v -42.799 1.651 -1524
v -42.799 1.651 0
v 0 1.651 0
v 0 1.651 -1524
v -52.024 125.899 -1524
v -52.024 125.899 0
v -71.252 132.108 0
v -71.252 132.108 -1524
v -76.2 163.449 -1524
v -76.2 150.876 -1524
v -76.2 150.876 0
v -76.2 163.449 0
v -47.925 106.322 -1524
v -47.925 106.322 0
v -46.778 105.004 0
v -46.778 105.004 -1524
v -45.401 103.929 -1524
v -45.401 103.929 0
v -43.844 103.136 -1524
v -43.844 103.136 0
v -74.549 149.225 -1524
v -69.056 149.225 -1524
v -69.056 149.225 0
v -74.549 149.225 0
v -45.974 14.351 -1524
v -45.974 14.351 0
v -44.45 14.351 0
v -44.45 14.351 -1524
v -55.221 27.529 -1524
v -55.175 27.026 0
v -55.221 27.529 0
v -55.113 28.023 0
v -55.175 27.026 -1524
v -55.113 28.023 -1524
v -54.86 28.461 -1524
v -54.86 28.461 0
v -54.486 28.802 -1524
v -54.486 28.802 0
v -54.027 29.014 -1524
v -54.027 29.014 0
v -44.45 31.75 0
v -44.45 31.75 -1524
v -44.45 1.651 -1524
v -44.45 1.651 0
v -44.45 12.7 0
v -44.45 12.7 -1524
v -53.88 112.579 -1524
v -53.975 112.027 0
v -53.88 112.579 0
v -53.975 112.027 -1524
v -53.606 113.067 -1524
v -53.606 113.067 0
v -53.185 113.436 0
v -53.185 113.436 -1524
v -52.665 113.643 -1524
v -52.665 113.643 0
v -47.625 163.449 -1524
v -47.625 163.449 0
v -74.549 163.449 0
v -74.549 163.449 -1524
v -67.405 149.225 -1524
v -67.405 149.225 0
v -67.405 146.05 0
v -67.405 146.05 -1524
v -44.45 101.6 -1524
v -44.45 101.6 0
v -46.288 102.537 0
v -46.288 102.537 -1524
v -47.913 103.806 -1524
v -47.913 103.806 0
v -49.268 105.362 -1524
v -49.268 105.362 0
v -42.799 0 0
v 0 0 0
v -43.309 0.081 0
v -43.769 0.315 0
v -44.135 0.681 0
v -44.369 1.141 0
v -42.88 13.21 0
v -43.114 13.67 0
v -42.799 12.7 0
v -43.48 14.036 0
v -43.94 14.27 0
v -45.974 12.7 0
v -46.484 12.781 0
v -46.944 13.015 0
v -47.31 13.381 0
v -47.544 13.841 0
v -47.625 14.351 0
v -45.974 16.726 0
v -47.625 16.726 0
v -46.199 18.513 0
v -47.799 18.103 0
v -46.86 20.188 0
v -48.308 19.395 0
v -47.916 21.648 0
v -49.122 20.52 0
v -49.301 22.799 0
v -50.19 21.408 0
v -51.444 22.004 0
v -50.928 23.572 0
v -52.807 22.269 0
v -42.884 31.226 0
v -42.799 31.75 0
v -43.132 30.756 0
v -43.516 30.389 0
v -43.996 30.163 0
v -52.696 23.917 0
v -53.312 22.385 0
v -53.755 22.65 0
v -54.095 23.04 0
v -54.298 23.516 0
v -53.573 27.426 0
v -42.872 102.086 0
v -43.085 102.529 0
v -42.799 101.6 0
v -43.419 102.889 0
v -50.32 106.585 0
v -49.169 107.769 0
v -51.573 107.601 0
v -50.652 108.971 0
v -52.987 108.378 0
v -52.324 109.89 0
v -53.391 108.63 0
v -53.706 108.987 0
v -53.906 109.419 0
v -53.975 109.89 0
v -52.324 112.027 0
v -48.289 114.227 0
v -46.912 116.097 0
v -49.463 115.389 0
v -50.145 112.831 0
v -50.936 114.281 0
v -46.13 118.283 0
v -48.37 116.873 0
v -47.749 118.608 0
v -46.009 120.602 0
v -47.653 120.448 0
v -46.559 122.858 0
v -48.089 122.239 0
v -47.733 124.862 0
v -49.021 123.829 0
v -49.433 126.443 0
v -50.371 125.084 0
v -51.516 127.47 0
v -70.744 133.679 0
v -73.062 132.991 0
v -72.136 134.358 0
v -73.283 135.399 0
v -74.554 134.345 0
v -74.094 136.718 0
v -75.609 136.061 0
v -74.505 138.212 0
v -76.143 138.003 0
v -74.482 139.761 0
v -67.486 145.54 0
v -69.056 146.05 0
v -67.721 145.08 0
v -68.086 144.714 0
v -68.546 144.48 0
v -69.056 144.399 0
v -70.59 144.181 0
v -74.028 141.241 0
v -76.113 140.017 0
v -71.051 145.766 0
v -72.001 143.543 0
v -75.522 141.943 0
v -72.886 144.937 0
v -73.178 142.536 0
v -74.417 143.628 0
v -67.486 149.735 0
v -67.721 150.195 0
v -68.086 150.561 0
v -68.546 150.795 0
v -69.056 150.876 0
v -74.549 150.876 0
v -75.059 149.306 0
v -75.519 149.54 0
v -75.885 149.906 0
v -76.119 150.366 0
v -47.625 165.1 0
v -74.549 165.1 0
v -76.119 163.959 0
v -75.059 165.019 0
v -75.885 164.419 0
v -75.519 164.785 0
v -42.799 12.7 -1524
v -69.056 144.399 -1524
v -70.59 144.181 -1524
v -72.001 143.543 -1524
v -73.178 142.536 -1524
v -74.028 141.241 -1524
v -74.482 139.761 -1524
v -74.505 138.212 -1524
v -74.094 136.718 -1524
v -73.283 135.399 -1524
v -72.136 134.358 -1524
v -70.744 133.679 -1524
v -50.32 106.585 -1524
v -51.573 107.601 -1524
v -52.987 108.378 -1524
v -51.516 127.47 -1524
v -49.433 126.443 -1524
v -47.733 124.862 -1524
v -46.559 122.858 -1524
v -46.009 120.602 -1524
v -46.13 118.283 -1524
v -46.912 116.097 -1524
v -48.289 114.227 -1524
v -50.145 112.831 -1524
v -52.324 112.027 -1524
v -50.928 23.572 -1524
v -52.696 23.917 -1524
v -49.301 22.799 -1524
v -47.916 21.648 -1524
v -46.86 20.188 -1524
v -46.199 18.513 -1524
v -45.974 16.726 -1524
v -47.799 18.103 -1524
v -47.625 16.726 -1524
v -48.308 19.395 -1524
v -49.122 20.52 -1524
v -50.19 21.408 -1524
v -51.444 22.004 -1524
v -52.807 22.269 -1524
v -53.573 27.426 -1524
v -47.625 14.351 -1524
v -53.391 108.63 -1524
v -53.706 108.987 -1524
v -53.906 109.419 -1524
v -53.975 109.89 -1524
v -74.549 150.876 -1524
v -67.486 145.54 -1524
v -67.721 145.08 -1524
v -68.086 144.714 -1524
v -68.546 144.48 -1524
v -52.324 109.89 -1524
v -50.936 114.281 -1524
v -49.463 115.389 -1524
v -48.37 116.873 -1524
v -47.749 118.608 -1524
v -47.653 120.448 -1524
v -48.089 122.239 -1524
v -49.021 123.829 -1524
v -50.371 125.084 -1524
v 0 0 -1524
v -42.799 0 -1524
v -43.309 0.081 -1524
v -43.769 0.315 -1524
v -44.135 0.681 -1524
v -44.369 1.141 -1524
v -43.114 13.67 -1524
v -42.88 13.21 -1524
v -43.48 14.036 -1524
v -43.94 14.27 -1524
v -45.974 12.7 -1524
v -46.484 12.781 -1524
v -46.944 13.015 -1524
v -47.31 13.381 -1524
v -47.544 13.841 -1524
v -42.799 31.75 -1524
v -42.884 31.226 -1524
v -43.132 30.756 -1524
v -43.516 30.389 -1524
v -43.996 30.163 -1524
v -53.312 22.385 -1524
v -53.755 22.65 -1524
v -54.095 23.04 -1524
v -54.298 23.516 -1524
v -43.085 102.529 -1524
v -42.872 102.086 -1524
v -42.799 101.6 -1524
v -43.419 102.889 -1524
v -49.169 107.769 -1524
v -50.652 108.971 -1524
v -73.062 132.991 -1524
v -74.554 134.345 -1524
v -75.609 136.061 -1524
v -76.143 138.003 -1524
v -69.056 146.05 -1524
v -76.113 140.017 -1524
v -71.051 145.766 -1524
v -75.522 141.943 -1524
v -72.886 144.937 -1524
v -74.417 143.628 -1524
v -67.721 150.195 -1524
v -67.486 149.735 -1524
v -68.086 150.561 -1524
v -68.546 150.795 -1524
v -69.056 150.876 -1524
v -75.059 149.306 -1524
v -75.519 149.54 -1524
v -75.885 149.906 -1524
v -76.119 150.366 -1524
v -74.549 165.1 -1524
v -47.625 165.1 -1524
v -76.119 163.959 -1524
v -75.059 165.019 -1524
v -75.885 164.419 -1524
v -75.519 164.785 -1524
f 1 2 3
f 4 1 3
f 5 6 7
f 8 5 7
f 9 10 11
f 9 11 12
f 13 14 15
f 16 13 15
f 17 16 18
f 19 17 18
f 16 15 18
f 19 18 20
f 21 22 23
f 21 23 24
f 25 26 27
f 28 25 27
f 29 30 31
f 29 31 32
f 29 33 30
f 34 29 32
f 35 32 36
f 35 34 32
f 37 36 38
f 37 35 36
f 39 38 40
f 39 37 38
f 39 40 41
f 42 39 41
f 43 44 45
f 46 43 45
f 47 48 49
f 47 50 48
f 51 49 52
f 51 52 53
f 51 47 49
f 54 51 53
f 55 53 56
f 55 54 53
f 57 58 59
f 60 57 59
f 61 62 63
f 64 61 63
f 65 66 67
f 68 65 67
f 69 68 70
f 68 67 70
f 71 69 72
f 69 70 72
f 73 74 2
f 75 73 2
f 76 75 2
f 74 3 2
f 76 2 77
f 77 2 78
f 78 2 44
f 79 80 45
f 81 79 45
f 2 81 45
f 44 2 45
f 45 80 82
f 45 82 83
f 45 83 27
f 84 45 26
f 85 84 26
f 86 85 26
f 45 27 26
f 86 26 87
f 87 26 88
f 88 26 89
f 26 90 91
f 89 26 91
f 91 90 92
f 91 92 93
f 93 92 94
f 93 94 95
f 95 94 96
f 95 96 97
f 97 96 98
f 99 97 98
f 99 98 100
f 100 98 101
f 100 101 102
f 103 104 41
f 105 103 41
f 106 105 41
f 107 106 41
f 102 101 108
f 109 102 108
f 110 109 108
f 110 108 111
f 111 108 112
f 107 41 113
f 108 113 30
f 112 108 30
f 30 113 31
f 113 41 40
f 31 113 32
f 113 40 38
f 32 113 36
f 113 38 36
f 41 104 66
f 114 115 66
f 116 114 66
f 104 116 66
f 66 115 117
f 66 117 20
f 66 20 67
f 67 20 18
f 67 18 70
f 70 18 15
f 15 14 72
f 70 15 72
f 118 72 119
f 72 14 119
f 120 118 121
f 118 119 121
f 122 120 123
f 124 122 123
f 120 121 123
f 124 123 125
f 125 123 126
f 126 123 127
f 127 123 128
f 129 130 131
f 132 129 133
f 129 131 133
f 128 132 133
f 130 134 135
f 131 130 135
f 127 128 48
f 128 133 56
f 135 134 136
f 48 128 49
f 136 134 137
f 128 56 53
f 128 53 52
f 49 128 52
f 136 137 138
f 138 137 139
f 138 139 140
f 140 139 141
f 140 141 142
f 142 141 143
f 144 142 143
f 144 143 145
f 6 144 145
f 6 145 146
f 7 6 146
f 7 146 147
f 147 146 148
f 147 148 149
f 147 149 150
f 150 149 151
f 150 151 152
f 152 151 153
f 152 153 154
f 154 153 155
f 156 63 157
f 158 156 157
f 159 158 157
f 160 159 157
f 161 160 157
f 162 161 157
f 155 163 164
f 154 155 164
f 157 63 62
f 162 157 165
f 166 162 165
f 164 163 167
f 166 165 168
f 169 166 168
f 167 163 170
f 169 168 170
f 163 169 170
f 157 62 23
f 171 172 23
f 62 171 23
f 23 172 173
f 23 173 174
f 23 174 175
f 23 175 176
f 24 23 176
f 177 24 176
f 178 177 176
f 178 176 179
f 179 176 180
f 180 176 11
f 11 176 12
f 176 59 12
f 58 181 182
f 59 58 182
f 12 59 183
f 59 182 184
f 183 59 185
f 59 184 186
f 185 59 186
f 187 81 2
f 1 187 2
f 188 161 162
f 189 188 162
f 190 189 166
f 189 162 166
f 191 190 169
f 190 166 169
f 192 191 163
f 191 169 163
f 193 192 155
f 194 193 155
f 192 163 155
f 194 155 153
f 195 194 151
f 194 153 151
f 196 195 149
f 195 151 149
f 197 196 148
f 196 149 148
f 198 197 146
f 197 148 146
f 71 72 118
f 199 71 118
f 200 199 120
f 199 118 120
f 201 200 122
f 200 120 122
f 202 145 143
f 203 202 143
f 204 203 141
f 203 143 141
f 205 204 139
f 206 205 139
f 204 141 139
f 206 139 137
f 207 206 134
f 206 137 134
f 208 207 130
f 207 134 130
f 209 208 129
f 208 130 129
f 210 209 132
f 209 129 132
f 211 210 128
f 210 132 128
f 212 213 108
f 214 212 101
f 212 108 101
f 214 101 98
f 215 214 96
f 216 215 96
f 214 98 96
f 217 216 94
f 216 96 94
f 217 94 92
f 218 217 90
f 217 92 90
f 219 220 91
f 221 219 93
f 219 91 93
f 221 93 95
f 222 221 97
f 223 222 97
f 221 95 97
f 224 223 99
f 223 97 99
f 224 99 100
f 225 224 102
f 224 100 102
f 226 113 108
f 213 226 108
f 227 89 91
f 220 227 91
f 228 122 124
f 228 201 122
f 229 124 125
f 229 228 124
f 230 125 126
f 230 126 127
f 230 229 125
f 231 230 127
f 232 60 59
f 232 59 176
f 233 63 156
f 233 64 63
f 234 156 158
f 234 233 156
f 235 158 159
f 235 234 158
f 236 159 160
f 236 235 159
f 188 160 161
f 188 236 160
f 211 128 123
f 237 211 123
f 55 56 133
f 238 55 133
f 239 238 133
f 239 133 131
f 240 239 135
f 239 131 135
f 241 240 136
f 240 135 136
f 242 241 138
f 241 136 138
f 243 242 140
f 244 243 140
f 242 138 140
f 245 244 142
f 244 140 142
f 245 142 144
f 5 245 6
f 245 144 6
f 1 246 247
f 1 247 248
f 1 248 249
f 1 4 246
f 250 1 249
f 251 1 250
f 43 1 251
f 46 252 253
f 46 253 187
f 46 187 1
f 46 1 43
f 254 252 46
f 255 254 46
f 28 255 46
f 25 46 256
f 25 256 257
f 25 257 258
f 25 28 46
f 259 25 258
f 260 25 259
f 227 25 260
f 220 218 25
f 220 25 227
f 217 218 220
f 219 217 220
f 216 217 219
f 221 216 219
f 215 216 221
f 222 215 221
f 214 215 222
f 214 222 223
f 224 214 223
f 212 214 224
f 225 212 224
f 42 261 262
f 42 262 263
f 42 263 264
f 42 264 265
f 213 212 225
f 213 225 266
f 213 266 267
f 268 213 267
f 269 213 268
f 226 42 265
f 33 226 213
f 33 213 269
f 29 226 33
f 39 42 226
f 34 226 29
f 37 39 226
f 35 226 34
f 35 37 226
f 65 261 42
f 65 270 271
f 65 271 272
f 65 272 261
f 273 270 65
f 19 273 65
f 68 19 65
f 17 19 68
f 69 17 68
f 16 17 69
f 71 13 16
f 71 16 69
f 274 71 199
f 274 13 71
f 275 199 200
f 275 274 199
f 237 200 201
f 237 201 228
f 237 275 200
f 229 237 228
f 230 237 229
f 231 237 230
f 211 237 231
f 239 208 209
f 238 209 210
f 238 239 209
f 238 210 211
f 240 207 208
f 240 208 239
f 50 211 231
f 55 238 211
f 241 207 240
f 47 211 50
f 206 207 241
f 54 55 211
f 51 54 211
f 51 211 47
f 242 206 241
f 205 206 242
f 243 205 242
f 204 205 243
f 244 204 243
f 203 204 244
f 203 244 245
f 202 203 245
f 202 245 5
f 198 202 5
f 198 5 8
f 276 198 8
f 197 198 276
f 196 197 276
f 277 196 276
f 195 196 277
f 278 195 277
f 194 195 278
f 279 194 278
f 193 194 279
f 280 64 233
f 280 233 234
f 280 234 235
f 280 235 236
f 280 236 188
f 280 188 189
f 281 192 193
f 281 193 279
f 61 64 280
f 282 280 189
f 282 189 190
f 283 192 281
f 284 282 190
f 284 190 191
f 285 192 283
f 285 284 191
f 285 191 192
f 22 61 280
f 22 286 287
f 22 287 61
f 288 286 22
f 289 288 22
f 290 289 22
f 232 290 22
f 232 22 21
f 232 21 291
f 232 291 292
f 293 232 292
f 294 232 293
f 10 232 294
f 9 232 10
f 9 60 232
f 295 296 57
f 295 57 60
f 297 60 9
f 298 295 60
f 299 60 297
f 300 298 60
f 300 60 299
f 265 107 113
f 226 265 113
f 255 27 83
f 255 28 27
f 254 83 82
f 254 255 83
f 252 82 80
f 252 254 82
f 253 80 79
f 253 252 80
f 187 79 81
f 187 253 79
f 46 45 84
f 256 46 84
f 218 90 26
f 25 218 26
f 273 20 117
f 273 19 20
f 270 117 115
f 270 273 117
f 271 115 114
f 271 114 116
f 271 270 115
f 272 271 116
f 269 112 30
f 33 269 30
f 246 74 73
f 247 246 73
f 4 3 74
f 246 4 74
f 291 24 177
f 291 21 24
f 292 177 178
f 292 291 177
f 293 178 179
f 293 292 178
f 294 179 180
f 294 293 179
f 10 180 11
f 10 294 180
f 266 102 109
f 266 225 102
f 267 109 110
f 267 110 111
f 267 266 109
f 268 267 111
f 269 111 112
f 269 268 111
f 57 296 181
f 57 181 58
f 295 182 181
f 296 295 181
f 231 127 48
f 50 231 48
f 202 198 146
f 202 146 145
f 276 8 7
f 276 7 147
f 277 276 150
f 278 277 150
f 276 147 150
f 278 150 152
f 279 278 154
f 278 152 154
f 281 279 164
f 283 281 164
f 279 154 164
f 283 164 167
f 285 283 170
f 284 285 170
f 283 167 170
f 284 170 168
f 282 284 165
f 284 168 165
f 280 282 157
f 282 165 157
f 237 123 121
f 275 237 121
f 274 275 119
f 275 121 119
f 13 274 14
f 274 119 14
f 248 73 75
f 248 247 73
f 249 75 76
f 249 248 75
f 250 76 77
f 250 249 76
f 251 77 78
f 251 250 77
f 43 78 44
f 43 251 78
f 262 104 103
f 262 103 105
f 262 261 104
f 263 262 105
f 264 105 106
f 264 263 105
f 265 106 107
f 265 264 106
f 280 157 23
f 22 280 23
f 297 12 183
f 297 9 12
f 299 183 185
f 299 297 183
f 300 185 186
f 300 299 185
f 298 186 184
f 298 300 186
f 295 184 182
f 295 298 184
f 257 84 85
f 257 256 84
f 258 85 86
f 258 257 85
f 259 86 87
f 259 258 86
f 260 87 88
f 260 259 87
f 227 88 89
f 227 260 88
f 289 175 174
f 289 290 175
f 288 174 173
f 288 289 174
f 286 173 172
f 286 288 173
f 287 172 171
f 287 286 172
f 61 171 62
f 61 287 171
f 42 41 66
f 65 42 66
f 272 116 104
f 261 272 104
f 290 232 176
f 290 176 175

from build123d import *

# Parameters (mm, degrees)
EXTRUDE_THIN1_DEPTH = 1524
FILLET1_R           = 1.651


with BuildPart() as part:
    # Sketch1 → Extrude-Thin1 (new body)
    with BuildSketch(Plane.XY):
        with BuildLine():
            Line((0, 0), (-44.45, 0))
            Line((-44.45, 0), (-44.45, 12.7))
            Line((-44.45, 12.7), (-47.625, 12.7))
            Line((-47.625, 12.7), (-47.625, 16.725738686))
            ThreePointArc((-47.625, 16.725738686), (-49.543830542, 20.925868892), (-53.975, 22.225))
            Line((-53.975, 22.225), (-55.5625, 28.575))
            Line((-55.5625, 28.575), (-44.45, 31.75))
            Line((-44.45, 31.75), (-44.45, 101.6))
            ThreePointArc((-44.45, 101.6), (-47.130906672, 103.132600901), (-49.268021434, 105.361696367))
            ThreePointArc((-49.268021434, 105.361696367), (-51.342554678, 107.440960699), (-53.975, 108.74375))
            Line((-53.975, 108.74375), (-53.975, 113.50625))
            ThreePointArc((-53.975, 113.50625), (-47.702285259, 118.868550766), (-52.023643923, 125.898990228))
            Line((-52.023643923, 125.898990228), (-71.251525587, 132.108167244))
            ThreePointArc((-71.251525587, 132.108167244), (-76.113054084, 140.017411638), (-69.05625, 146.05))
            Line((-69.05625, 146.05), (-69.05625, 149.225))
            Line((-69.05625, 149.225), (-76.2, 149.225))
            Line((-76.2, 149.225), (-76.2, 165.1))
            Line((-76.2, 165.1), (-47.625, 165.1))
            Line((-47.625, 165.1), (-47.625, 163.449))
            Line((-47.625, 163.449), (-74.549, 163.449))
            Line((-74.549, 163.449), (-74.549, 150.876))
            Line((-74.549, 150.876), (-67.40525, 150.876))
            Line((-67.40525, 150.876), (-67.40525, 144.145))
            ThreePointArc((-67.40525, 144.145), (-74.289142714, 140.575721893), (-70.744173007, 133.679279703))
            Line((-70.744173007, 133.679279703), (-51.516291343, 127.470102687))
            ThreePointArc((-51.516291343, 127.470102687), (-45.984921685, 119.438339092), (-52.324, 112.027444216))
            Line((-52.324, 112.027444216), (-52.324, 109.890107647))
            ThreePointArc((-52.324, 109.890107647), (-49.883528392, 108.403175809), (-47.925046246, 106.322018525))
            ThreePointArc((-47.925046246, 106.322018525), (-45.671413632, 104.108692809), (-42.799, 102.794573098))
            Line((-42.799, 102.794573098), (-42.799, 30.504648368))
            Line((-42.799, 30.504648368), (-53.573493562, 27.426221636))
            Line((-53.573493562, 27.426221636), (-52.696098481, 23.916641311))
            ThreePointArc((-52.696098481, 23.916641311), (-47.916220995, 21.647519069), (-45.974, 16.725738686))
            Line((-45.974, 16.725738686), (-45.974, 14.351))
            Line((-45.974, 14.351), (-42.799, 14.351))
            Line((-42.799, 14.351), (-42.799, 1.651))
            Line((-42.799, 1.651), (0, 1.651))
            Line((0, 1.651), (0, 0))
        make_face()
    extrude(amount=-EXTRUDE_THIN1_DEPTH)

    # Fillet1
    fillet1_edges = [part.edges().sort_by_distance(p)[0] for p in [
        (-67.40525, 150.876, -762),
        (-67.40525, 144.145, -762),
        (-42.799, 102.794573098, -762),
        (-42.799, 30.504648368, -762),
        (-42.799, 14.351, -762),
        (-44.45, 0, -762),
        (-47.625, 12.7, -762),
        (-53.975, 22.225, -762),
        (-55.5625, 28.575, -762),
        (-53.975, 108.74375, -762),
        (-53.975, 113.50625, -762),
        (-76.2, 149.225, -762),
        (-76.2, 165.1, -762),
    ]]
    fillet(fillet1_edges, radius=FILLET1_R)


solid = part.part
